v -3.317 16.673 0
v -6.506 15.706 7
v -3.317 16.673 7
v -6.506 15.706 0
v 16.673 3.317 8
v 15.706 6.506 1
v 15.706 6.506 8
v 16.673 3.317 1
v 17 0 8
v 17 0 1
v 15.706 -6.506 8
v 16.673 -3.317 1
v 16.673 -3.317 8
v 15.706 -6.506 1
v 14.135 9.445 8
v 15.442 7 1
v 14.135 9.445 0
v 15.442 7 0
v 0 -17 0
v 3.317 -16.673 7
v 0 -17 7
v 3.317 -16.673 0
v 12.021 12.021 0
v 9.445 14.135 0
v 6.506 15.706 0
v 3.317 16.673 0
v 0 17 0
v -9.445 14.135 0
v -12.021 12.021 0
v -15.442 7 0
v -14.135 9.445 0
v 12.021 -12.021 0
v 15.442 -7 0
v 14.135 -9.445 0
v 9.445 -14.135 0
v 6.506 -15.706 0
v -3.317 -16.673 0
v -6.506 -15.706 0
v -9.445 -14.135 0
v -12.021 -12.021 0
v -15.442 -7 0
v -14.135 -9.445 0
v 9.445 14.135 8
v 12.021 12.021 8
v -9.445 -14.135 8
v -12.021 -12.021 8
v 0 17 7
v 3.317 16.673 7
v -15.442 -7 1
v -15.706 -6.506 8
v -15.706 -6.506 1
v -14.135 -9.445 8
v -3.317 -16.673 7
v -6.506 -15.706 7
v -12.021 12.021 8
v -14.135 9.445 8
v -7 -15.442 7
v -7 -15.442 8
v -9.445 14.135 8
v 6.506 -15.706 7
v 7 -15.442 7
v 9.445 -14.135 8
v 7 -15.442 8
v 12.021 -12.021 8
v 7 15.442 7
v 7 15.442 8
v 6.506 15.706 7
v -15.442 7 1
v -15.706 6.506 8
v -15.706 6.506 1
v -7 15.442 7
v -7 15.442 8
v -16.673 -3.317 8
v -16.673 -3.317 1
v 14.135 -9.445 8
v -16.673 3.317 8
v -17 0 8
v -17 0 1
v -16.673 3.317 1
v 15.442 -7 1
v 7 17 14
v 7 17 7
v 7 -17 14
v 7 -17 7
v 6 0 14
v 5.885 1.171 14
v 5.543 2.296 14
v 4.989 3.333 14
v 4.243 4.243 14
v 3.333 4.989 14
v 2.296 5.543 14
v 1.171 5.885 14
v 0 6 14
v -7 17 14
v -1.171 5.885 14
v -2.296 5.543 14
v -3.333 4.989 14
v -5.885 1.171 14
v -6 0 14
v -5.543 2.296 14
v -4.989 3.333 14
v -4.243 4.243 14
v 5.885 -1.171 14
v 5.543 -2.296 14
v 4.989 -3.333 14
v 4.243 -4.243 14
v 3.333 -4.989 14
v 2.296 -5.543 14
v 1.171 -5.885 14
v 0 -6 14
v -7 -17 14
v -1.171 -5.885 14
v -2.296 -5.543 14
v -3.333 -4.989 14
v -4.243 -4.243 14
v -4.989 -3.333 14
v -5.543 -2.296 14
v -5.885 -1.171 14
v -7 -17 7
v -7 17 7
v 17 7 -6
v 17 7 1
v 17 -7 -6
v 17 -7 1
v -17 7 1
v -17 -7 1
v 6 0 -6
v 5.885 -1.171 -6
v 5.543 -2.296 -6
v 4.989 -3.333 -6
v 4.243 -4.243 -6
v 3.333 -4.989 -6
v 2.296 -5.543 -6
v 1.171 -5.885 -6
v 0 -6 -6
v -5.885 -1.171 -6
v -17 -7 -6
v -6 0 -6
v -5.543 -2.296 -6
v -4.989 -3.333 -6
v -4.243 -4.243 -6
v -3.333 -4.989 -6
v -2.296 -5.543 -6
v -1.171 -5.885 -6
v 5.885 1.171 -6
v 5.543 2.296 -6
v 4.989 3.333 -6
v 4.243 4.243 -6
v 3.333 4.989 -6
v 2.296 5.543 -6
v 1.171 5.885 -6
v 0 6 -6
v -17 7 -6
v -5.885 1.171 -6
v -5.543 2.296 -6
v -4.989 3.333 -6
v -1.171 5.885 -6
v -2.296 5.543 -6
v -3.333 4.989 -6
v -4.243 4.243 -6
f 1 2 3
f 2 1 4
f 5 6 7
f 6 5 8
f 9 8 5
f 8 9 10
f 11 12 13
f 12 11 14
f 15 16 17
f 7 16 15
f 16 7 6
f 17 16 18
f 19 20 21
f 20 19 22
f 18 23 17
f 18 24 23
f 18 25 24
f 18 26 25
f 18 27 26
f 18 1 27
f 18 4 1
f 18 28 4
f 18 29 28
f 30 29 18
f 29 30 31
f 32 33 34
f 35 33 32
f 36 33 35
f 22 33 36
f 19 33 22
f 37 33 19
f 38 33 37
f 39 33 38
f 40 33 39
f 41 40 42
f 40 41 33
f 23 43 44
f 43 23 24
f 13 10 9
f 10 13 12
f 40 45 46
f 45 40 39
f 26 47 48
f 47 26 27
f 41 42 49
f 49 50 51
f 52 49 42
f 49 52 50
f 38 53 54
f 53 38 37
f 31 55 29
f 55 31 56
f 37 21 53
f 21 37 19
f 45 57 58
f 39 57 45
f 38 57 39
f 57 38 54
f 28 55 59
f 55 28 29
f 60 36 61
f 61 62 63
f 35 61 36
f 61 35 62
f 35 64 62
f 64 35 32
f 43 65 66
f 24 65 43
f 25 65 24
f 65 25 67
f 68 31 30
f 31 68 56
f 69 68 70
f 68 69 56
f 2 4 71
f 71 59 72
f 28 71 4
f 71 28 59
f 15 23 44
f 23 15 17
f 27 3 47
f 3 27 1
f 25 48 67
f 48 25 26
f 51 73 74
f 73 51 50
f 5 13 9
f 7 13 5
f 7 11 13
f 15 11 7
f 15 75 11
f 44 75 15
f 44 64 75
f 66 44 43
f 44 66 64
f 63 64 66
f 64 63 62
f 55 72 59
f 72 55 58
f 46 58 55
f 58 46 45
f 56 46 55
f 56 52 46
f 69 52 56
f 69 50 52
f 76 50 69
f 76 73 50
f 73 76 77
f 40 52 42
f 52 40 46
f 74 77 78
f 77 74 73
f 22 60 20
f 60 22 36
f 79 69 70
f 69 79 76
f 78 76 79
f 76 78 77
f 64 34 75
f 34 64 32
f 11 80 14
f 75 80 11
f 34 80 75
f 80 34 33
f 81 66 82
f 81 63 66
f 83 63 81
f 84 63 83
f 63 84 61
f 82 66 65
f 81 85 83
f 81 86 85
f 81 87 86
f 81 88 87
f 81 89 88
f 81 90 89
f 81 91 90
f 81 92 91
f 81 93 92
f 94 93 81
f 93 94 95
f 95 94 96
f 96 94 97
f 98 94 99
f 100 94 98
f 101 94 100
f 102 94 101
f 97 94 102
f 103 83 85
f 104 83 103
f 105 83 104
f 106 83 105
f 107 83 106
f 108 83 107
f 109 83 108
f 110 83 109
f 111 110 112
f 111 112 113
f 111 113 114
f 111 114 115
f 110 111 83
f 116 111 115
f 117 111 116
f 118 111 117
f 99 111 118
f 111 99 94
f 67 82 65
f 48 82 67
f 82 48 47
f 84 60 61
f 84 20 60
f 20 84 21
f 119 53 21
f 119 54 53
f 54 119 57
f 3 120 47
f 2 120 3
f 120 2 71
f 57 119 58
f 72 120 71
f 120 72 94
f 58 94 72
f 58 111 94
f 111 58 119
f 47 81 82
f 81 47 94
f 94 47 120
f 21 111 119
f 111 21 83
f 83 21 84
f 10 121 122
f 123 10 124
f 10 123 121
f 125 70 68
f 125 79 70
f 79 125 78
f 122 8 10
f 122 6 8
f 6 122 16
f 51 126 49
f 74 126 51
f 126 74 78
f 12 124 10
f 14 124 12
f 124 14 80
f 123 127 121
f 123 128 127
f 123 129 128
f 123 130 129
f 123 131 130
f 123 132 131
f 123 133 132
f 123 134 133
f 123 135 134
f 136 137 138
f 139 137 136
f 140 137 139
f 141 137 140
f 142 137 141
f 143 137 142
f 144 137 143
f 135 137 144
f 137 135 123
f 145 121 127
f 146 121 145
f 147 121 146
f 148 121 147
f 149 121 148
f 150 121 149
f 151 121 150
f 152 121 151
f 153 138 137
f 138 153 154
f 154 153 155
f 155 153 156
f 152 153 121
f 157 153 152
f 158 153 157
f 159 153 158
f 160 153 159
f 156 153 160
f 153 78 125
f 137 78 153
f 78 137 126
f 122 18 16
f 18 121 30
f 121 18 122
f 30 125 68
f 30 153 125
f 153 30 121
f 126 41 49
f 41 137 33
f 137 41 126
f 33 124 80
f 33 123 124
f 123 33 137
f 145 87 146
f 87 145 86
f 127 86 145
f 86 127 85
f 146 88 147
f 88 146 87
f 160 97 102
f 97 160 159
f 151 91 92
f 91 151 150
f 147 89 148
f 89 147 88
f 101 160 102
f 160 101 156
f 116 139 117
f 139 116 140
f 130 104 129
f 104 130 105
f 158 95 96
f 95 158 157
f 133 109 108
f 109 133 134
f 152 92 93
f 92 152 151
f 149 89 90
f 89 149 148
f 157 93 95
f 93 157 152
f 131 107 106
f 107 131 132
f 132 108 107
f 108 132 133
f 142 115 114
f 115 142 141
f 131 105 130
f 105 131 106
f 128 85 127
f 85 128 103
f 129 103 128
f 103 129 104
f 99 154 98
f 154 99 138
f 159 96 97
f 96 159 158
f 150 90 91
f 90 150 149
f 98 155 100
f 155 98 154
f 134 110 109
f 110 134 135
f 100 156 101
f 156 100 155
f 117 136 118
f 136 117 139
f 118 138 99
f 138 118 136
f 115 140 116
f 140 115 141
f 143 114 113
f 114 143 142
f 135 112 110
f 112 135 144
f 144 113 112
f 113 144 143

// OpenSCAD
$fn = 32;

// ----------------------------------------------------------------------
// Oldham coupling disc: 34 x 20 mm
// ----------------------------------------------------------------------

// --- parameters (mm) ---
disc_d = 34;              // disc diameter
disc_t = 8;               // disc thickness
tongue_w = 14;            // tongue width
tongue_h = 6;             // tongue height
bore_d = 12;              // centre lightening bore

module disc() {
  cylinder(h = disc_t, d = disc_d);
  /* tongue on the top face, sunk 1 mm into the disc */
  translate([-tongue_w / 2, -disc_d / 2, disc_t - 1]) cube([tongue_w, disc_d, tongue_h + 1]);
  /* slot wall on the bottom face, 90 degrees turned */
  translate([-disc_d / 2, -tongue_w / 2, -tongue_h]) cube([disc_d, tongue_w, tongue_h + 1]);
}

difference() {
  disc();
  translate([0, 0, -tongue_h - 1]) cylinder(h = disc_t + 2 * tongue_h + 2, d = bore_d);
}
